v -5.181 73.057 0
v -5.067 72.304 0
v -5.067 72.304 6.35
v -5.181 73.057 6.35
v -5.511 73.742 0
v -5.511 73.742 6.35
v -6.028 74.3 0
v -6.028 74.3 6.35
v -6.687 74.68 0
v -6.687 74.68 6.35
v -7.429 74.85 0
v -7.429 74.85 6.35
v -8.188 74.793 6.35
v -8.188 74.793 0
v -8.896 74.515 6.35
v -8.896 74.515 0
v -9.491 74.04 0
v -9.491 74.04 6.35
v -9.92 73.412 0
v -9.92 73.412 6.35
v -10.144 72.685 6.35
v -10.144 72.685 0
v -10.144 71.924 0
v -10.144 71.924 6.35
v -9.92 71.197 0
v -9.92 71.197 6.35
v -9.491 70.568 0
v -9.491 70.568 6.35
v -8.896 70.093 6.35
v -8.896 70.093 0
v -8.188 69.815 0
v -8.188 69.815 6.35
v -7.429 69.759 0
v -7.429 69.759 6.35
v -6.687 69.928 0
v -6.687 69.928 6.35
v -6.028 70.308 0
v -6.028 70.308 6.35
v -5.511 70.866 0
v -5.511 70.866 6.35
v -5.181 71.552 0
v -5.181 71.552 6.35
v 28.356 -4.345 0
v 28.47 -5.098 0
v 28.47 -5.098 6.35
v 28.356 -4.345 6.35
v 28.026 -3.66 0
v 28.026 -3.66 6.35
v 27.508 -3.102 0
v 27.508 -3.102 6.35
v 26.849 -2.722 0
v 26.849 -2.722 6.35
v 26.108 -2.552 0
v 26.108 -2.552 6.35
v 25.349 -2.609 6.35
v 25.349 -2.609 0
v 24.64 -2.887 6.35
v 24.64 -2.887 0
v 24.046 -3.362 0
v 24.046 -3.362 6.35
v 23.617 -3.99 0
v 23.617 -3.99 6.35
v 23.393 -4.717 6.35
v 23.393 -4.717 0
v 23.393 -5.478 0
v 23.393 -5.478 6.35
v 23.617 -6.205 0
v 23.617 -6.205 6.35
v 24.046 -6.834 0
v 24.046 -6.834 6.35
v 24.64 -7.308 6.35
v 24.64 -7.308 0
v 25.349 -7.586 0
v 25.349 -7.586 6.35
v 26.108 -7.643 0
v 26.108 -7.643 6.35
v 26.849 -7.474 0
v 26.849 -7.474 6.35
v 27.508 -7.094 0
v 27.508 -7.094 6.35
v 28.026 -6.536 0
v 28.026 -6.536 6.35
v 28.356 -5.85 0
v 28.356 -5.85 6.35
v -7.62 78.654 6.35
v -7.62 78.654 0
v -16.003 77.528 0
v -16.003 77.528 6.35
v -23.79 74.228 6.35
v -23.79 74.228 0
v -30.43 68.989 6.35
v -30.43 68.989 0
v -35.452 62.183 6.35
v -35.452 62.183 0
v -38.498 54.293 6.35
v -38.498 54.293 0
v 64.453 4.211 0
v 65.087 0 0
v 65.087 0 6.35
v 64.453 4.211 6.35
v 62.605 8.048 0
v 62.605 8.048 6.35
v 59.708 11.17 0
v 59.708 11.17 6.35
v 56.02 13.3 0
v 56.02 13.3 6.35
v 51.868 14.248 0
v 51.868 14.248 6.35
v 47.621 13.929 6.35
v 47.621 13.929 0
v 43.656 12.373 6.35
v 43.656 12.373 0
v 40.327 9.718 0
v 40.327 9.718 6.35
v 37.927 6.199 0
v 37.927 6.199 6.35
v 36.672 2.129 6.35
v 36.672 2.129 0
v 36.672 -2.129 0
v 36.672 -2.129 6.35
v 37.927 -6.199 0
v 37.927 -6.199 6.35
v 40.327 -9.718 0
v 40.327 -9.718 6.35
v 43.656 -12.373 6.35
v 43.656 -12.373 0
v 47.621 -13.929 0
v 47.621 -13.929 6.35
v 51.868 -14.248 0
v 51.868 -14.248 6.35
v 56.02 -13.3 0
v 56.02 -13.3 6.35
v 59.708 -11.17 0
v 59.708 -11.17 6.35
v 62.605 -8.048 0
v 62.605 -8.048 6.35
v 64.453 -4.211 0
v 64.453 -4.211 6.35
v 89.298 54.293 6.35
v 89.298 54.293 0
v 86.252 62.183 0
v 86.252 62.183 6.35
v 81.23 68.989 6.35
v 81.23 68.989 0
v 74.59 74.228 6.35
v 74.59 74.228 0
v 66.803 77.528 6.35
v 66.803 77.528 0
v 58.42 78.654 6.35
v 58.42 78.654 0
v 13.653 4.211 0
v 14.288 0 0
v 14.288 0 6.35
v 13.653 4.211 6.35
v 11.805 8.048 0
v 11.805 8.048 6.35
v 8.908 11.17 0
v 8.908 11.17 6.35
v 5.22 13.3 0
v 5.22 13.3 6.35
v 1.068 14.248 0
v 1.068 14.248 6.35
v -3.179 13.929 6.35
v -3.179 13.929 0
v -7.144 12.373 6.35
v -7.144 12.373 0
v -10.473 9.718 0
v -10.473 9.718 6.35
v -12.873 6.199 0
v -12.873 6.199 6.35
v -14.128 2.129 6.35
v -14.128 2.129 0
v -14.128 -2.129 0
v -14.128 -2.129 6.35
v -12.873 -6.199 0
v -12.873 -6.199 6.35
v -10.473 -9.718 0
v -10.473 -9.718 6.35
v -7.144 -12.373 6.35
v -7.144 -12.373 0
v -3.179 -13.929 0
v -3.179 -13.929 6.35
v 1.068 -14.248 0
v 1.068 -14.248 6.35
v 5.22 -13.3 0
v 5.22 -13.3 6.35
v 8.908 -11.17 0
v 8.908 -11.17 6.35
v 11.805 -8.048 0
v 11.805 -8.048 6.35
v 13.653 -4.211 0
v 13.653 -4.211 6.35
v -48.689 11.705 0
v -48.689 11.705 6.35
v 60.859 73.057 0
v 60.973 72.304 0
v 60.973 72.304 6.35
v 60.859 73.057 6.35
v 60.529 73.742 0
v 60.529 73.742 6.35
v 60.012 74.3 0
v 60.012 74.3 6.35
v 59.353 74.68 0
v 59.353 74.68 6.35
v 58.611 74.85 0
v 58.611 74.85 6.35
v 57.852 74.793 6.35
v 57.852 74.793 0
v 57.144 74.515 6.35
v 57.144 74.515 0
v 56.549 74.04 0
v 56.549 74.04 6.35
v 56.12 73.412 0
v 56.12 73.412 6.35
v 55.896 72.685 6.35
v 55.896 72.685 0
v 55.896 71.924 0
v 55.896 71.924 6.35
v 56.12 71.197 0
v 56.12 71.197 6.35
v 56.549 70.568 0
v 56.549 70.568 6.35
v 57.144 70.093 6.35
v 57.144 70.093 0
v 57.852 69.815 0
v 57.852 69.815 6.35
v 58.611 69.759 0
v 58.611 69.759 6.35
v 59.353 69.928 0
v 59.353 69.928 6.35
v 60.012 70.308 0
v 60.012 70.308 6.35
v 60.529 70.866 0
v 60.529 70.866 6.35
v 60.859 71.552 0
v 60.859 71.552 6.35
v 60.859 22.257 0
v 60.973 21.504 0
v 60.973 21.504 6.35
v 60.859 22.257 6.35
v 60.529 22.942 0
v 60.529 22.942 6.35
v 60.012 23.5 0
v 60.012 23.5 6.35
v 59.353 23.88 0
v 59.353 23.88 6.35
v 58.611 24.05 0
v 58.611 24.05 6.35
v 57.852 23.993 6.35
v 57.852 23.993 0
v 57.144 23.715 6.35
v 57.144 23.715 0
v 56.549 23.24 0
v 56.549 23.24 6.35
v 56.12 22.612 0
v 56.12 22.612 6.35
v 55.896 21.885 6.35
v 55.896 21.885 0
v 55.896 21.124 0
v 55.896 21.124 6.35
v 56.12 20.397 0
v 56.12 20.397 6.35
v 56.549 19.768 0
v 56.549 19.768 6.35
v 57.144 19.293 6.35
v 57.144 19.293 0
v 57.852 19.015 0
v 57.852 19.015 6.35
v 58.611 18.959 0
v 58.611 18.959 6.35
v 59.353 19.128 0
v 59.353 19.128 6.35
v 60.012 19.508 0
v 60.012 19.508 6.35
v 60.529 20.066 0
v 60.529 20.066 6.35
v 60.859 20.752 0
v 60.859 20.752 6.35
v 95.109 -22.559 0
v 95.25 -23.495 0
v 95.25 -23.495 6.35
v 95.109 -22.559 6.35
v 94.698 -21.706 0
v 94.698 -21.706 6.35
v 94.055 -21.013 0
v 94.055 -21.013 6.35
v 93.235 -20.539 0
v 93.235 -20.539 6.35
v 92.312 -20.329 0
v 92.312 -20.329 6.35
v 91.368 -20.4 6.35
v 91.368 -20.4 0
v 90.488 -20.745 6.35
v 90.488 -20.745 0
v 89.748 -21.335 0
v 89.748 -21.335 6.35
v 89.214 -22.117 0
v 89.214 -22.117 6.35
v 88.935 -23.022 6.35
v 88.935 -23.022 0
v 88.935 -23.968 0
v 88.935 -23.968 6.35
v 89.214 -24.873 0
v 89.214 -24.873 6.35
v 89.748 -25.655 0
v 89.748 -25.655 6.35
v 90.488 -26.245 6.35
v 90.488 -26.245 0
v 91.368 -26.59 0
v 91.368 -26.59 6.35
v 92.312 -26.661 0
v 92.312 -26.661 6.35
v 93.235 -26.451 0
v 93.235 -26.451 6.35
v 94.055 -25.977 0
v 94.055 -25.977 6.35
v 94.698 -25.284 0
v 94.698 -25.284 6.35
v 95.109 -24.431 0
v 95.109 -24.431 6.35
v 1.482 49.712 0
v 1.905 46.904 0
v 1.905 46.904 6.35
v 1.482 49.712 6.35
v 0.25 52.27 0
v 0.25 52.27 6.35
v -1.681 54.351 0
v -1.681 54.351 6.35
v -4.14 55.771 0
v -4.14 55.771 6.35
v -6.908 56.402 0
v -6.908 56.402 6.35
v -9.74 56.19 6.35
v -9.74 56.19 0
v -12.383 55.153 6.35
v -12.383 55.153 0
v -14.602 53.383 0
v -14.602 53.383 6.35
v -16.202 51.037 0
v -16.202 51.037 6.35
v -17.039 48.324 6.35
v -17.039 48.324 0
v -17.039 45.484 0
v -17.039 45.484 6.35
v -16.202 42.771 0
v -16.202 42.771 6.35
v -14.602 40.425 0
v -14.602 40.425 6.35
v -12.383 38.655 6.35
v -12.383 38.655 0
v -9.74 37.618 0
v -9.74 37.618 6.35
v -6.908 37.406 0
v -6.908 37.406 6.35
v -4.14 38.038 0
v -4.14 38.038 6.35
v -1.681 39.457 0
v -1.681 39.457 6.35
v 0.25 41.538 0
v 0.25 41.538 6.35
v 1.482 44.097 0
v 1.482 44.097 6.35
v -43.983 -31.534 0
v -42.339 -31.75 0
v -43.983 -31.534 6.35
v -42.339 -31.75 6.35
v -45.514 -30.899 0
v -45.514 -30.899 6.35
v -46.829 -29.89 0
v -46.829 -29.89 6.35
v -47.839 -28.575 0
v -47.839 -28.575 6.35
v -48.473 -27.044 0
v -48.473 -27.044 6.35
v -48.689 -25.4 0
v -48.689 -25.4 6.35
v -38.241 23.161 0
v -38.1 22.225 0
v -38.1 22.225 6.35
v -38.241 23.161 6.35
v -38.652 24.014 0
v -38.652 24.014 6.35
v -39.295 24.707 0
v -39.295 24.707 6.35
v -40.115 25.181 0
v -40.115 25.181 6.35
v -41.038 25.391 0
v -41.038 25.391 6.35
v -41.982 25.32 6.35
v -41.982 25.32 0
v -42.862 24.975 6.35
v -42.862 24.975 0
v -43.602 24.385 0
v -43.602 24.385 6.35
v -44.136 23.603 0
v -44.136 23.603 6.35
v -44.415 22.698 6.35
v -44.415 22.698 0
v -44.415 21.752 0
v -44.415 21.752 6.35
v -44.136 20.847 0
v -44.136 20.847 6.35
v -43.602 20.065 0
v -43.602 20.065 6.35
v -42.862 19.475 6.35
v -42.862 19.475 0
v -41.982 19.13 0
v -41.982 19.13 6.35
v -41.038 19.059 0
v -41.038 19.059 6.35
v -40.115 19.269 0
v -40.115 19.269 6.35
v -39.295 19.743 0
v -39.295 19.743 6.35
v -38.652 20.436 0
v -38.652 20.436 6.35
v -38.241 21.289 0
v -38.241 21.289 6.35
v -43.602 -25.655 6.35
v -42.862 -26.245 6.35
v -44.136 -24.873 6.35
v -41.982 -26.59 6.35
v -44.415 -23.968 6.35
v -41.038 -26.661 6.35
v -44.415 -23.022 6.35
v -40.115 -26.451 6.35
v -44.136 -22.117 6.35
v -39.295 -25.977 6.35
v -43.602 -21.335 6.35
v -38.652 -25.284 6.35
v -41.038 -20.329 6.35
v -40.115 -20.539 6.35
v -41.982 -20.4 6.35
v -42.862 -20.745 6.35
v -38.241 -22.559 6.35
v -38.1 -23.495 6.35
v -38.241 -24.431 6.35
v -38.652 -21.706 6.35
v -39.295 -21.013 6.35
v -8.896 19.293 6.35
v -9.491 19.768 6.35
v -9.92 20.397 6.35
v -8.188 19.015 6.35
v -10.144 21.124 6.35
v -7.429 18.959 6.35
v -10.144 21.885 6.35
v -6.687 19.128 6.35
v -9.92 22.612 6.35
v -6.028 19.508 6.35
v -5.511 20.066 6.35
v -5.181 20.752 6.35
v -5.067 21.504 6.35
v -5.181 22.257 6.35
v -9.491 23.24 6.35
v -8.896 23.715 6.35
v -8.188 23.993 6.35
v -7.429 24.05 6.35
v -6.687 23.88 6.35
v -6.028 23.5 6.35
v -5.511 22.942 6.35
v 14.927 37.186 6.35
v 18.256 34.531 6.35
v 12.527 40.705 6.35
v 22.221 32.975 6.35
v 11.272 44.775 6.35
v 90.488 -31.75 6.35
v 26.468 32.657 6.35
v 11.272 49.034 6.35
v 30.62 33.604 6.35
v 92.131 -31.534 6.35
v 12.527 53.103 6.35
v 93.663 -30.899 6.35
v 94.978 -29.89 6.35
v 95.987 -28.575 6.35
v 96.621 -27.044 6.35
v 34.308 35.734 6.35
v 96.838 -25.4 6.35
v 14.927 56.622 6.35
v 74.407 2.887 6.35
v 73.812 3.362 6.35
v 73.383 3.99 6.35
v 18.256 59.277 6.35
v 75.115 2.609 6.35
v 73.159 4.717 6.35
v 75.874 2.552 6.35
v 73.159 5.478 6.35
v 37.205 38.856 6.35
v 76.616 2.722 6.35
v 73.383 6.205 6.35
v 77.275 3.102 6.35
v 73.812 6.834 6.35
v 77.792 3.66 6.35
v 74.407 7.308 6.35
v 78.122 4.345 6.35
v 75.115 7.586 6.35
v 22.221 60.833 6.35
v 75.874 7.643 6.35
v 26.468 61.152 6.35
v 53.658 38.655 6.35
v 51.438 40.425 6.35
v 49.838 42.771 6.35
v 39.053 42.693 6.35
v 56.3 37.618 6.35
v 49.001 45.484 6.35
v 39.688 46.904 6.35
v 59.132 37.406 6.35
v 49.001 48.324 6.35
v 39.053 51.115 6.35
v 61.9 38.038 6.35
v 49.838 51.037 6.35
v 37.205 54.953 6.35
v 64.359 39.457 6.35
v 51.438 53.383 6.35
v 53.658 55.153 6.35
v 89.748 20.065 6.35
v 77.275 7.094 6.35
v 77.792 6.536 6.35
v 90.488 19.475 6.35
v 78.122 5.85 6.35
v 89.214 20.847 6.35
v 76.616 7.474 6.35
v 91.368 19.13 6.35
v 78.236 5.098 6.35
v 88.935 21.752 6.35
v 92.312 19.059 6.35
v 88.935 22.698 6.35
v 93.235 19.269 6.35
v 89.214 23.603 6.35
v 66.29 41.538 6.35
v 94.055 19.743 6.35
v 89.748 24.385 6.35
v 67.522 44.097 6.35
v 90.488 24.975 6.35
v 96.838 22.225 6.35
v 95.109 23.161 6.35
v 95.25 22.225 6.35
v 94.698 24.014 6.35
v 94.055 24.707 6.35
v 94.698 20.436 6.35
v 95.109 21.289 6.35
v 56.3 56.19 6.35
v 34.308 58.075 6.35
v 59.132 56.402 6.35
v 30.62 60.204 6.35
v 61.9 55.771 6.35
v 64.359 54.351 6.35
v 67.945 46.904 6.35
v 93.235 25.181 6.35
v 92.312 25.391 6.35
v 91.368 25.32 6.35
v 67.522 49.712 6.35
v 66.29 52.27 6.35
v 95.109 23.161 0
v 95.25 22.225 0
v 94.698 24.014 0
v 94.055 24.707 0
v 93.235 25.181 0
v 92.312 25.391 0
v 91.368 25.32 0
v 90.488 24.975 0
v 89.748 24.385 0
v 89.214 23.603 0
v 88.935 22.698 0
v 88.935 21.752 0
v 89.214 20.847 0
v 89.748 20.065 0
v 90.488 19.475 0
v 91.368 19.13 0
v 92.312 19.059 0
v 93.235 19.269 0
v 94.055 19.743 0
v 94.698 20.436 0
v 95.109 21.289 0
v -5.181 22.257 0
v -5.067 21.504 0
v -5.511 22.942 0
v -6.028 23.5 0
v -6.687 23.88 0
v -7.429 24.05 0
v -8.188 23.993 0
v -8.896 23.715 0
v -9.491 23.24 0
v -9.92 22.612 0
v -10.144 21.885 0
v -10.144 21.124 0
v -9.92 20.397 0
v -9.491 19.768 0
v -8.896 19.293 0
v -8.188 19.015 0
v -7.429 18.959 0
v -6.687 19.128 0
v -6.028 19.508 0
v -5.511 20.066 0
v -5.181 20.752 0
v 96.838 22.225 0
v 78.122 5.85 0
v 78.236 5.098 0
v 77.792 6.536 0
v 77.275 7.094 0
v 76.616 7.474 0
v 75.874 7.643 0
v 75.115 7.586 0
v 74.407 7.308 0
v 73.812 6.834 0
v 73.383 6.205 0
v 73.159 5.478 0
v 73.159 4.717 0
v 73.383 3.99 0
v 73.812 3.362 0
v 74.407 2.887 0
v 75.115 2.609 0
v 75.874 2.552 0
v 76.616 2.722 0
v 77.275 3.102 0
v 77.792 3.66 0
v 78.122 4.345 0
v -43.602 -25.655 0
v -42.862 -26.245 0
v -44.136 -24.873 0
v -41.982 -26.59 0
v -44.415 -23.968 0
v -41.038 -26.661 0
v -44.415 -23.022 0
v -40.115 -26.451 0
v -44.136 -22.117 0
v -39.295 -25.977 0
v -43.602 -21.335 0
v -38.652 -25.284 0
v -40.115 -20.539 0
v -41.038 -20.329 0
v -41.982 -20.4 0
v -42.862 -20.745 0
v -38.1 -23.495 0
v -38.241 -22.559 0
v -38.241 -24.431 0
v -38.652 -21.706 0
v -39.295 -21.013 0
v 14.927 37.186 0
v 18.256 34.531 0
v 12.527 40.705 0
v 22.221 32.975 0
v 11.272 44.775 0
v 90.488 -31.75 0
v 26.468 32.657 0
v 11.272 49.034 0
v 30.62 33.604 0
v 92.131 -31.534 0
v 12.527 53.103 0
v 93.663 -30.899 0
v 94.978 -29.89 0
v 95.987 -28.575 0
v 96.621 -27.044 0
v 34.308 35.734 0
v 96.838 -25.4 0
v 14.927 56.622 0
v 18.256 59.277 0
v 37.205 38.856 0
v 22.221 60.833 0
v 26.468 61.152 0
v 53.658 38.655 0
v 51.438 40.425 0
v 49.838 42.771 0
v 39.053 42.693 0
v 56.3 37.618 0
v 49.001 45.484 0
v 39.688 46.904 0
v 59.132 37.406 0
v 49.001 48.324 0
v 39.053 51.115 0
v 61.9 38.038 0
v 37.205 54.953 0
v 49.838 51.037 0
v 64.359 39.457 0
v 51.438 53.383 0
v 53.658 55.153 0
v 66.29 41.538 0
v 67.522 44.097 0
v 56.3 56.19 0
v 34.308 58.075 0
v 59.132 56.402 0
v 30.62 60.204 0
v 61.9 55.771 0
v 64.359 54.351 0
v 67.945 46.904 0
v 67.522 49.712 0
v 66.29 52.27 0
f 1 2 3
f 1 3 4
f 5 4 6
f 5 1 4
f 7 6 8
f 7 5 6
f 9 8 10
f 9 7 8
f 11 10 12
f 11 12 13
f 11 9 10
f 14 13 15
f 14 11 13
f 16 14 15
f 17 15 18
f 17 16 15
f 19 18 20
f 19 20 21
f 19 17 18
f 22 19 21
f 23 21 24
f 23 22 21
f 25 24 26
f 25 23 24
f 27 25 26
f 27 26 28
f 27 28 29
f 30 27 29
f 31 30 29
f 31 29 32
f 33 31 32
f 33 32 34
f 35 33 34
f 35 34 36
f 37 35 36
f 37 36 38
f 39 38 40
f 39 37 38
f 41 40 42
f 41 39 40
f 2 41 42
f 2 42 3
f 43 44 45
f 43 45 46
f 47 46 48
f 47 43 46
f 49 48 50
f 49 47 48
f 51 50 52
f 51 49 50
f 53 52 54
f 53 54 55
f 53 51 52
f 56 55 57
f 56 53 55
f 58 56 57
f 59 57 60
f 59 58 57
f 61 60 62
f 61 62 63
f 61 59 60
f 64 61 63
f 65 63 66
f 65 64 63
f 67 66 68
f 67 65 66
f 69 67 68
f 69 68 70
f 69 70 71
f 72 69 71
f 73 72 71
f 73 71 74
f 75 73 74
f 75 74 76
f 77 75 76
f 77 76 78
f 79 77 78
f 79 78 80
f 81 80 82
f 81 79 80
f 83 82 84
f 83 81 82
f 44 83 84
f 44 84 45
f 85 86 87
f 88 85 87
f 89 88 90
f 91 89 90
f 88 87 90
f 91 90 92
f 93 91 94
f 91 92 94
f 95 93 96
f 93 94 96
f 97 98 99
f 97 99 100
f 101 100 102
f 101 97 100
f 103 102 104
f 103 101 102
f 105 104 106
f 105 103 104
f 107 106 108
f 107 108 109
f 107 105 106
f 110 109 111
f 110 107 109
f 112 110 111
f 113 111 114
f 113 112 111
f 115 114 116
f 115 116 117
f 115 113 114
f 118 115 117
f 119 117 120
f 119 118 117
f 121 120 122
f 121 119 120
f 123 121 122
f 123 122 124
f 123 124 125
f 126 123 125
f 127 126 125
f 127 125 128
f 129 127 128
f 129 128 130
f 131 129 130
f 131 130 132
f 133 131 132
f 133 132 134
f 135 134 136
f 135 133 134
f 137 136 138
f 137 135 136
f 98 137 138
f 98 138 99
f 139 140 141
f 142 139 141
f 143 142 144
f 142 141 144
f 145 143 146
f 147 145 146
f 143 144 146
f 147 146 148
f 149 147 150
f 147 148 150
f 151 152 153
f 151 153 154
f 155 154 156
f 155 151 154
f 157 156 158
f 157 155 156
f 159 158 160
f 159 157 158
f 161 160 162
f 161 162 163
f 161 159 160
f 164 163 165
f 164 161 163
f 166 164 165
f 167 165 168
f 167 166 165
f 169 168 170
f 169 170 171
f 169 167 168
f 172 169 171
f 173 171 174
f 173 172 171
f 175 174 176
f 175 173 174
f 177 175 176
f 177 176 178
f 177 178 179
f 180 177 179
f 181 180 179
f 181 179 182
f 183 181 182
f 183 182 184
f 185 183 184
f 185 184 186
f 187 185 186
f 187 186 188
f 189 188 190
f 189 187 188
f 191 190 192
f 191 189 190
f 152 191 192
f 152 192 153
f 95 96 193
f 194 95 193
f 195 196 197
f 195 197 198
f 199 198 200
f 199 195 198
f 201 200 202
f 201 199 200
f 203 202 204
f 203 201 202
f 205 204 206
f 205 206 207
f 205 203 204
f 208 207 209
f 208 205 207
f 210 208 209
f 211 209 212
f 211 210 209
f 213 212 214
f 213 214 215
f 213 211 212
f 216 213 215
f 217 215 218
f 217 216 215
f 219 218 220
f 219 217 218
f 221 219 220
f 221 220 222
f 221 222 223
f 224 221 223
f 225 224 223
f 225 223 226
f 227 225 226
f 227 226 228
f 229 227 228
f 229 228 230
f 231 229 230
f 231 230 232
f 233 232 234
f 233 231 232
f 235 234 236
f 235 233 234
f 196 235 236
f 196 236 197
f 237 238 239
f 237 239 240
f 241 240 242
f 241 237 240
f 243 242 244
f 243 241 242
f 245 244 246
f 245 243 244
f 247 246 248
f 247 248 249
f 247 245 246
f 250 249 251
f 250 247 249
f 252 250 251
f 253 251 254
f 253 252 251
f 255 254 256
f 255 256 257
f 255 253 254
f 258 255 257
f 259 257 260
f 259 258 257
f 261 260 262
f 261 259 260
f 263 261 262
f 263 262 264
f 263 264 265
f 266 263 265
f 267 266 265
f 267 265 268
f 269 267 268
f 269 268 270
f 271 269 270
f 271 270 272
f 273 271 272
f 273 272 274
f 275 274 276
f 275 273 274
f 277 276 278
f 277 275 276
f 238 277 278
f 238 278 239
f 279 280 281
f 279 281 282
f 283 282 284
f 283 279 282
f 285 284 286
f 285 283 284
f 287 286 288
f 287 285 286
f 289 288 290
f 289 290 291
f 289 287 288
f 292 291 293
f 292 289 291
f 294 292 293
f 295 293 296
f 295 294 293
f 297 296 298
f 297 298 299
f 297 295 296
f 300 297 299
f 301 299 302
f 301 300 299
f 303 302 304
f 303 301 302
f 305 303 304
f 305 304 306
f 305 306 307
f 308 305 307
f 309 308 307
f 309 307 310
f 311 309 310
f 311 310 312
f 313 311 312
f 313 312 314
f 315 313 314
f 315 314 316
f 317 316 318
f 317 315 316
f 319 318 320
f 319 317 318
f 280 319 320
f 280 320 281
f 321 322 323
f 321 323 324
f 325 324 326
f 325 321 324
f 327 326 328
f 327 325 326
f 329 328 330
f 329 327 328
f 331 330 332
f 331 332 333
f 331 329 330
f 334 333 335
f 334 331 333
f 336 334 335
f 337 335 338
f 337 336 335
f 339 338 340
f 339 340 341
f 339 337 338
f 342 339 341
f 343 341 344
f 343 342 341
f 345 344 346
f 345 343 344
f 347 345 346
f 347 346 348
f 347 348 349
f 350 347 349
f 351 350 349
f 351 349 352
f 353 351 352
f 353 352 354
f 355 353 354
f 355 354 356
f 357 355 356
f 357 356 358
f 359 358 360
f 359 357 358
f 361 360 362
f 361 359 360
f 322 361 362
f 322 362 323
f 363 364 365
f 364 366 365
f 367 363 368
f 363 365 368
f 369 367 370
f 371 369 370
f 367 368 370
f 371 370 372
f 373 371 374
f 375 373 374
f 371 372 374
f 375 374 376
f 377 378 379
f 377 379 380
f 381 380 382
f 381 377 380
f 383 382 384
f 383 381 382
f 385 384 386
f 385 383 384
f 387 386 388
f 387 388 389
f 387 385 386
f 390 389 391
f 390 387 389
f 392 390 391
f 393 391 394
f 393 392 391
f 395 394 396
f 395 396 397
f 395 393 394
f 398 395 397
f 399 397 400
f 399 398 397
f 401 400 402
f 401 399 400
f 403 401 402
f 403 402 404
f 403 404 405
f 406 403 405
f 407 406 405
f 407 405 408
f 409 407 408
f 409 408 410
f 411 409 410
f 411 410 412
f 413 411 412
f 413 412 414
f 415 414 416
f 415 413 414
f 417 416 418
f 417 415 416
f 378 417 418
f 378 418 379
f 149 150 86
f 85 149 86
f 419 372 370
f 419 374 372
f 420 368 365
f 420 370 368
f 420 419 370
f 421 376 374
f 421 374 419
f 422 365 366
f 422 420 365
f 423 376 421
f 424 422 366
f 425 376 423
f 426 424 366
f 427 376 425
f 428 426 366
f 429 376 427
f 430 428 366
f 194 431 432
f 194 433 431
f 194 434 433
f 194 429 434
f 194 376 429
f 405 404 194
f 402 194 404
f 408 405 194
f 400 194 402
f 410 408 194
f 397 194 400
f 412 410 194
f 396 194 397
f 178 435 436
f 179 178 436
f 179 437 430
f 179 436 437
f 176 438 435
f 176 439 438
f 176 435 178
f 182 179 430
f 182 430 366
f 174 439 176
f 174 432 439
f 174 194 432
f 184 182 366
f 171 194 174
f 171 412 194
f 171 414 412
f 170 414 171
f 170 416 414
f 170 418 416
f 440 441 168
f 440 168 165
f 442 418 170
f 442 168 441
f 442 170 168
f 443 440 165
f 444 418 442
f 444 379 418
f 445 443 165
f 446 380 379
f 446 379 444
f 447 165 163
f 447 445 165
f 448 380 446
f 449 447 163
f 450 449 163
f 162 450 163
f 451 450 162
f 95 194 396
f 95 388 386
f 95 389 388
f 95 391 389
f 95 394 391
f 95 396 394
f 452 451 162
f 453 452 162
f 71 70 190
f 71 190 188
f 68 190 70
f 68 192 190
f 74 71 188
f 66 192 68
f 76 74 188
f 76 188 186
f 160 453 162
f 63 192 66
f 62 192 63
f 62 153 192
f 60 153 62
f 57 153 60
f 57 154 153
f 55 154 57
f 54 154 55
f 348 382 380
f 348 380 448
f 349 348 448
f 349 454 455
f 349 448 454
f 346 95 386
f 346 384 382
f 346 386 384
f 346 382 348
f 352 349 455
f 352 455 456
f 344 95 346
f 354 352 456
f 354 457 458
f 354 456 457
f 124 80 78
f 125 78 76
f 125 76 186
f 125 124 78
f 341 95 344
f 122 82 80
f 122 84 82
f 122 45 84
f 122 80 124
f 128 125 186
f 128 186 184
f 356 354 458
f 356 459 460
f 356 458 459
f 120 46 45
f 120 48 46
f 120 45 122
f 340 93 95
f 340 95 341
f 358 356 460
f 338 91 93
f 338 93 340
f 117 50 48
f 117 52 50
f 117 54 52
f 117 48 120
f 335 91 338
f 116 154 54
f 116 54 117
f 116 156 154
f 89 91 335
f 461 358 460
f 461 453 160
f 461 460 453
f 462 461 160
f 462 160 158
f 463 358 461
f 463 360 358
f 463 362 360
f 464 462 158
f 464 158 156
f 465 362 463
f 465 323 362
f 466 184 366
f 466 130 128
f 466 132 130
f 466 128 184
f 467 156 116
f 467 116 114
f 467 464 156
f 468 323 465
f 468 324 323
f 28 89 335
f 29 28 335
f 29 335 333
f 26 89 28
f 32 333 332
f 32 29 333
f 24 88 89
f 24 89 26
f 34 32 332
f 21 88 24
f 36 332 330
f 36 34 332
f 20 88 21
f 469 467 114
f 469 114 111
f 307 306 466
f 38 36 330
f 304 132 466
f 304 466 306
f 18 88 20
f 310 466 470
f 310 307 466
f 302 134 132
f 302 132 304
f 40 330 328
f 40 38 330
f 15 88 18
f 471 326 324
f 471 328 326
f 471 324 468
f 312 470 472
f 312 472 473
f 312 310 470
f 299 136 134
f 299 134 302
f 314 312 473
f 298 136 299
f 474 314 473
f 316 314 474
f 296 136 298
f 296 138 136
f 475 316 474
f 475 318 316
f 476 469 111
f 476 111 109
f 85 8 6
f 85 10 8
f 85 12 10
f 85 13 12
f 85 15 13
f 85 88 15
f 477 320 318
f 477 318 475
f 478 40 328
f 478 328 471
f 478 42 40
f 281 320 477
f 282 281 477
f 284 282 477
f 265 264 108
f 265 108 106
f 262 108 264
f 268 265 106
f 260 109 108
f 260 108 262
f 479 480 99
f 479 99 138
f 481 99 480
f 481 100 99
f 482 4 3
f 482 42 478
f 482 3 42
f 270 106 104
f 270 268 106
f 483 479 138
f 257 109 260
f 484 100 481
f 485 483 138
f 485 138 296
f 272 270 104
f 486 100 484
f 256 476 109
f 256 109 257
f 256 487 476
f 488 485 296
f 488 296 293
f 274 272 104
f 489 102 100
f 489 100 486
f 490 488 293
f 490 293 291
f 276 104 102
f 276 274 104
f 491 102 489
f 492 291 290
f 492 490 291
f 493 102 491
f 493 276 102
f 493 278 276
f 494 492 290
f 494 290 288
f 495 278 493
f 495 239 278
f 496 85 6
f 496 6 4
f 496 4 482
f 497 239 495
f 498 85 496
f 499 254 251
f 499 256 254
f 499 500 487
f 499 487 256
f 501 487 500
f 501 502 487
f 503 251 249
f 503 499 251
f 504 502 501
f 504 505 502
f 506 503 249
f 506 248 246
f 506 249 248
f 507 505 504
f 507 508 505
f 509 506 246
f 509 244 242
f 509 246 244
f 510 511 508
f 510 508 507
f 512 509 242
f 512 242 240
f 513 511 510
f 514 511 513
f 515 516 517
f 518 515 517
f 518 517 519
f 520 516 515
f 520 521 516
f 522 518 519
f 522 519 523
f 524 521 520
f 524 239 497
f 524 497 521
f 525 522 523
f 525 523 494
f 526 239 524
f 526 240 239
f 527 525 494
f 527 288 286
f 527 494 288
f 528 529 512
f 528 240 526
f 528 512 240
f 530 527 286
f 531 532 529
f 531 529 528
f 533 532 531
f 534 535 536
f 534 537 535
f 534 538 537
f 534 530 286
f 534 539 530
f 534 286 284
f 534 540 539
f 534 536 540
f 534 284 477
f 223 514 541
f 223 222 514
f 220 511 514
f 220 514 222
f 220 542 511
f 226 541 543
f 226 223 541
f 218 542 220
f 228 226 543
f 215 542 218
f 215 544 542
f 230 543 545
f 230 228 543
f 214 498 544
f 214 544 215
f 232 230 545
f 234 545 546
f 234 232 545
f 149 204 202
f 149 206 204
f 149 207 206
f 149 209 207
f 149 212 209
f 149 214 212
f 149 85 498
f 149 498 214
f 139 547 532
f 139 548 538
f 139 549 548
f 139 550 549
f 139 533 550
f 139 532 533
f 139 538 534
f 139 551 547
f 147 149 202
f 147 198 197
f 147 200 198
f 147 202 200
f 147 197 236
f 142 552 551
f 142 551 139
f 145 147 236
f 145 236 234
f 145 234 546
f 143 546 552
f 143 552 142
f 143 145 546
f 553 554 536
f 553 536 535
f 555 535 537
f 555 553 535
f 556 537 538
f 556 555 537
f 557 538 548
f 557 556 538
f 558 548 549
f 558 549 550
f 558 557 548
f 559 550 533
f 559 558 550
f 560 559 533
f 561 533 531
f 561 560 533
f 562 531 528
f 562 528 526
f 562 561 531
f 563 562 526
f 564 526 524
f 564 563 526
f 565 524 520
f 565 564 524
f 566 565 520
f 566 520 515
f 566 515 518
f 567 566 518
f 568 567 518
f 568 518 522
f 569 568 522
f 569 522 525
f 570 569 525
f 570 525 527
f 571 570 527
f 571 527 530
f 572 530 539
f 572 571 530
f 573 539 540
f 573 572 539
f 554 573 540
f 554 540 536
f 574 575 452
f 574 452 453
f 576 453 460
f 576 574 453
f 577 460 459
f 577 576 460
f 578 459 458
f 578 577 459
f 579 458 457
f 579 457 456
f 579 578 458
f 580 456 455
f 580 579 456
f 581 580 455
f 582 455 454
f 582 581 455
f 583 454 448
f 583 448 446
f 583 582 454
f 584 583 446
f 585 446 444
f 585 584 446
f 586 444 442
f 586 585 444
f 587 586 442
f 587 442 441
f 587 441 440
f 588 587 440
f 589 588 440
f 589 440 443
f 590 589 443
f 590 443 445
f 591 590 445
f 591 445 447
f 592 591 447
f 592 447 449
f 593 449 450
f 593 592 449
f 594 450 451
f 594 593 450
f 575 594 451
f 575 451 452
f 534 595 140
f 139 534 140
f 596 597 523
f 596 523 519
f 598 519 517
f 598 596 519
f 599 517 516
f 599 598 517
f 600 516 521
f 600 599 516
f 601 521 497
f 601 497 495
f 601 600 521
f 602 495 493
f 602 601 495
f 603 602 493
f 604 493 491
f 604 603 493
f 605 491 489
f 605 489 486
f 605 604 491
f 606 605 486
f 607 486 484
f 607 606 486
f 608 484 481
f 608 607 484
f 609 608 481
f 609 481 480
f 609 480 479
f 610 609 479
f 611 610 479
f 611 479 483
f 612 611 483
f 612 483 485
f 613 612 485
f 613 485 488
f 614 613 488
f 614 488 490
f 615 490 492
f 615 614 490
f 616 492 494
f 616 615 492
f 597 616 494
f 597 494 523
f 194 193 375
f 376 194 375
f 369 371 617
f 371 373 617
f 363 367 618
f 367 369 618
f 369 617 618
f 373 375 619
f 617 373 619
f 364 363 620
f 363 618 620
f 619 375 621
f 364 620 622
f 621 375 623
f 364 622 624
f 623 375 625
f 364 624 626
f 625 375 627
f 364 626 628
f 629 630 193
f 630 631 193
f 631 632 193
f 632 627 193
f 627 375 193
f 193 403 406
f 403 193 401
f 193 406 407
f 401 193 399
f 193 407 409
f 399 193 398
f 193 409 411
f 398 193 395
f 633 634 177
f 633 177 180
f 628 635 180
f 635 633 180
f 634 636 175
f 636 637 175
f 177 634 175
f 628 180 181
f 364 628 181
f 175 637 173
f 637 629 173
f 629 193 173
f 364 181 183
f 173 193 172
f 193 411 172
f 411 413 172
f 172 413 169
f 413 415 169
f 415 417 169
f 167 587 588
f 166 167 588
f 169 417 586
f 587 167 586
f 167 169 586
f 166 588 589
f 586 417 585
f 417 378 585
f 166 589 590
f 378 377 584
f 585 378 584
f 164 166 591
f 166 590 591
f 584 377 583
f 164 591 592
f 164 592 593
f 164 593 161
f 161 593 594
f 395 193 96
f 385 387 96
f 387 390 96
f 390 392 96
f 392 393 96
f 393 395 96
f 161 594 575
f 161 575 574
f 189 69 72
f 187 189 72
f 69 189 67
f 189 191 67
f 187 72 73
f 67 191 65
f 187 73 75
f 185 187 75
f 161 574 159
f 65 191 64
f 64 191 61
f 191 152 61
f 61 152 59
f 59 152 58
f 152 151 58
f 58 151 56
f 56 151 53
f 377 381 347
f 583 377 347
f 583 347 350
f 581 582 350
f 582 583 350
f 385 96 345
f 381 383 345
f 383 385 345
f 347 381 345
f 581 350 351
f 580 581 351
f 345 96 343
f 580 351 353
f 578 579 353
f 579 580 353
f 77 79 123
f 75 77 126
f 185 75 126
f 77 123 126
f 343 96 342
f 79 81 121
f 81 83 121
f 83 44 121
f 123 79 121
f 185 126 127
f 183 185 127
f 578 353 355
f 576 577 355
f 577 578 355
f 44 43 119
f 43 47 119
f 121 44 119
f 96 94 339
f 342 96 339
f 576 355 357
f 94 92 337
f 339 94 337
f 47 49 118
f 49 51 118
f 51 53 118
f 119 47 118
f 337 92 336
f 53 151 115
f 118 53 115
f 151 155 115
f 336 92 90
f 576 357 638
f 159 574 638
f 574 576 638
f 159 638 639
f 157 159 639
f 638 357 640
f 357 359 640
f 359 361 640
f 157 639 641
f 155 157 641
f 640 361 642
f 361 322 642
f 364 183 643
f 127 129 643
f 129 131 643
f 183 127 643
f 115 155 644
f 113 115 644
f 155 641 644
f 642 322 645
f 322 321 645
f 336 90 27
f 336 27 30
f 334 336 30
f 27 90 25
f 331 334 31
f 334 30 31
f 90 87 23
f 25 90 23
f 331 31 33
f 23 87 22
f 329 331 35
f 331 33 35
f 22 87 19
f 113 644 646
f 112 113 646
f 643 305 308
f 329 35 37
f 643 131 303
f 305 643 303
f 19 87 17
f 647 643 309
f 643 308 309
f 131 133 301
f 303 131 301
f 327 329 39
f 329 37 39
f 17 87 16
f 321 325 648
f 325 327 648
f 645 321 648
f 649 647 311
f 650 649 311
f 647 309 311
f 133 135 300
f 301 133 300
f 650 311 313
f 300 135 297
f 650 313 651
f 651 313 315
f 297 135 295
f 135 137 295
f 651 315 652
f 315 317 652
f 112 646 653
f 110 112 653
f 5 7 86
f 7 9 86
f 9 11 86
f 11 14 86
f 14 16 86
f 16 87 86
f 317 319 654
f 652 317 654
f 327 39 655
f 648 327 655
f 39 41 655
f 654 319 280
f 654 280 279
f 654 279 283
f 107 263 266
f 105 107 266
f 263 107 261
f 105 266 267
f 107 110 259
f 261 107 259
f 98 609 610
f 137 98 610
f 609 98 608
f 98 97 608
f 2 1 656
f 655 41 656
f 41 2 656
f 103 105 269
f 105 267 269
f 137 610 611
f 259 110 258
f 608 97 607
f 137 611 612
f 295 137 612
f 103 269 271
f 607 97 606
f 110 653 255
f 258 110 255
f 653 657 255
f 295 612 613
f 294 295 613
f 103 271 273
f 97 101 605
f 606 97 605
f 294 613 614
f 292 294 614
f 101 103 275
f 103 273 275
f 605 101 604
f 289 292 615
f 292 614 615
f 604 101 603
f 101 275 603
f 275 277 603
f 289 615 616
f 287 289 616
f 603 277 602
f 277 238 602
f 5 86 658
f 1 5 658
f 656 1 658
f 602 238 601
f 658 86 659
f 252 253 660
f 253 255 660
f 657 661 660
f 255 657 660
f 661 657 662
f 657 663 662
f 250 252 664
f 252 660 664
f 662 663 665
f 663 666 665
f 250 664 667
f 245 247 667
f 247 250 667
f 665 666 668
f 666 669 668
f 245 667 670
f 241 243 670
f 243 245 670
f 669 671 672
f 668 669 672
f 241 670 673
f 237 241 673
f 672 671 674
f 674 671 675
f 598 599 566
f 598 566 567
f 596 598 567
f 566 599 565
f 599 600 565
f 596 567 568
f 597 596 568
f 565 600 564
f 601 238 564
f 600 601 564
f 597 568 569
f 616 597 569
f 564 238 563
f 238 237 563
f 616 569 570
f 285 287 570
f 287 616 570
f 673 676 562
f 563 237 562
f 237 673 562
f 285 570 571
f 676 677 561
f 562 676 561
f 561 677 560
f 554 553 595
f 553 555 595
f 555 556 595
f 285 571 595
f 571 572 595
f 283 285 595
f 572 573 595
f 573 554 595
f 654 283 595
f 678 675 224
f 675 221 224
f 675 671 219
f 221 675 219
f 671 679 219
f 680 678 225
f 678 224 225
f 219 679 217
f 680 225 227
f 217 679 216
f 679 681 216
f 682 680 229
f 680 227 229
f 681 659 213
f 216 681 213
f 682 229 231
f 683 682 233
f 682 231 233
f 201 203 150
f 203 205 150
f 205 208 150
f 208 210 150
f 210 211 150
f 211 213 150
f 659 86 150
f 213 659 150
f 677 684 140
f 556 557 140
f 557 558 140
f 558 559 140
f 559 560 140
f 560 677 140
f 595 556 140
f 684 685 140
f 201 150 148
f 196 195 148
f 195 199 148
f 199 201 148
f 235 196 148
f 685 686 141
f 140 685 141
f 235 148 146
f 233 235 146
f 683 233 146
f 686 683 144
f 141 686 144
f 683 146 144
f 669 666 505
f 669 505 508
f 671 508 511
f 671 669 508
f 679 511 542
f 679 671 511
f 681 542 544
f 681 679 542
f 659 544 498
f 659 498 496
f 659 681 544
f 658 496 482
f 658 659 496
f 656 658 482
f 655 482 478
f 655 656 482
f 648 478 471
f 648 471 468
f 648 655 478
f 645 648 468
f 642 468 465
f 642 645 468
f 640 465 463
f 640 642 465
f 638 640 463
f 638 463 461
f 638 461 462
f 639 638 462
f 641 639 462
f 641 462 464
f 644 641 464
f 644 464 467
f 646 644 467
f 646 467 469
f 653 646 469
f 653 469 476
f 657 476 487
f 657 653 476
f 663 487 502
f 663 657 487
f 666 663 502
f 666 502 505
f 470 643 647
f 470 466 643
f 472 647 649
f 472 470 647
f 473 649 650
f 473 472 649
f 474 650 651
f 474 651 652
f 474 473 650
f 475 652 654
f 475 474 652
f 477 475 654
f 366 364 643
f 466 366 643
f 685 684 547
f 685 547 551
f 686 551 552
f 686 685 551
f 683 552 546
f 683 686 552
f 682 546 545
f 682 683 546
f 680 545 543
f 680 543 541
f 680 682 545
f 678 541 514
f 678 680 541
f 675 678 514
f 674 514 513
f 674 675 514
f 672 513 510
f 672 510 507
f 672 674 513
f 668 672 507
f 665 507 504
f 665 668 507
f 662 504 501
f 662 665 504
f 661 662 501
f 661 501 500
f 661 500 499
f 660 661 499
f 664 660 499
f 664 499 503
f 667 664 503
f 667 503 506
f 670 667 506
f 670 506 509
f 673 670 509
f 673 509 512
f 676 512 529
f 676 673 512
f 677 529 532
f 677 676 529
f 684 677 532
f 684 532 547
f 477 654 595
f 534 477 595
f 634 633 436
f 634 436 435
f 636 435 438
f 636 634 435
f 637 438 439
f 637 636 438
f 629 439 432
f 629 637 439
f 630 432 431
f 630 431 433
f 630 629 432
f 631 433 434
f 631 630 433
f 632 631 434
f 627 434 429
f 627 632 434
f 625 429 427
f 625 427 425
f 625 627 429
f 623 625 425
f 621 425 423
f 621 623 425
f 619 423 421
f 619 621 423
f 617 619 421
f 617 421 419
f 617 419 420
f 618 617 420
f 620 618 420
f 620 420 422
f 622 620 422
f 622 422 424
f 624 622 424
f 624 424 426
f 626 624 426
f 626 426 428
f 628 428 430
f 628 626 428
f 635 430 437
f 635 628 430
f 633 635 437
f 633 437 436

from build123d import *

# Parameters (mm, degrees)
SKETCH1_R           = 14.2875
SKETCH1_R_2         = 2.5527
SKETCH1_R_3         = 9.525
SKETCH1_R_4         = 3.175
BOSS_EXTRUDE2_DEPTH = 6.35
FILLET1_R           = 6.35


with BuildPart() as part:
    # Sketch1 → Boss-Extrude2 (new body)
    with BuildSketch(Plane.XY):
        with BuildLine():
            Line((-48.689252979, -31.75), (96.8375, -31.75))
            Line((96.8375, -31.75), (96.8375, 22.225))
            Line((96.8375, 22.225), (89.29823289, 54.293104778))
            ThreePointArc((89.29823289, 54.293104778), (78.085476575, 71.830633337), (58.42, 78.654110694))
            Line((58.42, 78.654110694), (-7.62, 78.654110694))
            ThreePointArc((-7.62, 78.654110694), (-27.285476575, 71.830633337), (-38.49823289, 54.293104778))
            Line((-38.49823289, 54.293104778), (-48.689252979, 11.70534681))
            Line((-48.689252979, 11.70534681), (-48.689252979, -31.75))
        make_face()
        Circle(SKETCH1_R, mode=Mode.SUBTRACT)
        with Locations((50.8, 0)):
            Circle(SKETCH1_R, mode=Mode.SUBTRACT)
        with Locations((25.4, 46.904110694)):
            Circle(SKETCH1_R, mode=Mode.SUBTRACT)
        with Locations((-7.62, 72.304110694)):
            Circle(SKETCH1_R_2, mode=Mode.SUBTRACT)
        with Locations((-7.62, 21.504110694)):
            Circle(SKETCH1_R_2, mode=Mode.SUBTRACT)
        with Locations((58.42, 72.304110694)):
            Circle(SKETCH1_R_2, mode=Mode.SUBTRACT)
        with Locations((58.42, 21.504110694)):
            Circle(SKETCH1_R_2, mode=Mode.SUBTRACT)
        with Locations((58.42, 46.904110694)):
            Circle(SKETCH1_R_3, mode=Mode.SUBTRACT)
        with Locations((-7.62, 46.904110694)):
            Circle(SKETCH1_R_3, mode=Mode.SUBTRACT)
        with Locations((75.683179842, 5.09778)):
            Circle(SKETCH1_R_2, mode=Mode.SUBTRACT)
        with Locations((25.916820158, -5.09778)):
            Circle(SKETCH1_R_2, mode=Mode.SUBTRACT)
        with Locations((-41.275, 22.225)):
            Circle(SKETCH1_R_4, mode=Mode.SUBTRACT)
        with Locations((92.075, 22.225)):
            Circle(SKETCH1_R_4, mode=Mode.SUBTRACT)
        with Locations((-41.275, -23.495)):
            Circle(SKETCH1_R_4, mode=Mode.SUBTRACT)
        with Locations((92.075, -23.495)):
            Circle(SKETCH1_R_4, mode=Mode.SUBTRACT)
    extrude(amount=BOSS_EXTRUDE2_DEPTH)

    # Fillet1
    fillet1_edges = [part.edges().sort_by_distance(p)[0] for p in [
        (96.8375, -31.75, 3.175),
        (-48.689252979, -31.75, 3.175),
    ]]
    fillet(fillet1_edges, radius=FILLET1_R)


solid = part.part
